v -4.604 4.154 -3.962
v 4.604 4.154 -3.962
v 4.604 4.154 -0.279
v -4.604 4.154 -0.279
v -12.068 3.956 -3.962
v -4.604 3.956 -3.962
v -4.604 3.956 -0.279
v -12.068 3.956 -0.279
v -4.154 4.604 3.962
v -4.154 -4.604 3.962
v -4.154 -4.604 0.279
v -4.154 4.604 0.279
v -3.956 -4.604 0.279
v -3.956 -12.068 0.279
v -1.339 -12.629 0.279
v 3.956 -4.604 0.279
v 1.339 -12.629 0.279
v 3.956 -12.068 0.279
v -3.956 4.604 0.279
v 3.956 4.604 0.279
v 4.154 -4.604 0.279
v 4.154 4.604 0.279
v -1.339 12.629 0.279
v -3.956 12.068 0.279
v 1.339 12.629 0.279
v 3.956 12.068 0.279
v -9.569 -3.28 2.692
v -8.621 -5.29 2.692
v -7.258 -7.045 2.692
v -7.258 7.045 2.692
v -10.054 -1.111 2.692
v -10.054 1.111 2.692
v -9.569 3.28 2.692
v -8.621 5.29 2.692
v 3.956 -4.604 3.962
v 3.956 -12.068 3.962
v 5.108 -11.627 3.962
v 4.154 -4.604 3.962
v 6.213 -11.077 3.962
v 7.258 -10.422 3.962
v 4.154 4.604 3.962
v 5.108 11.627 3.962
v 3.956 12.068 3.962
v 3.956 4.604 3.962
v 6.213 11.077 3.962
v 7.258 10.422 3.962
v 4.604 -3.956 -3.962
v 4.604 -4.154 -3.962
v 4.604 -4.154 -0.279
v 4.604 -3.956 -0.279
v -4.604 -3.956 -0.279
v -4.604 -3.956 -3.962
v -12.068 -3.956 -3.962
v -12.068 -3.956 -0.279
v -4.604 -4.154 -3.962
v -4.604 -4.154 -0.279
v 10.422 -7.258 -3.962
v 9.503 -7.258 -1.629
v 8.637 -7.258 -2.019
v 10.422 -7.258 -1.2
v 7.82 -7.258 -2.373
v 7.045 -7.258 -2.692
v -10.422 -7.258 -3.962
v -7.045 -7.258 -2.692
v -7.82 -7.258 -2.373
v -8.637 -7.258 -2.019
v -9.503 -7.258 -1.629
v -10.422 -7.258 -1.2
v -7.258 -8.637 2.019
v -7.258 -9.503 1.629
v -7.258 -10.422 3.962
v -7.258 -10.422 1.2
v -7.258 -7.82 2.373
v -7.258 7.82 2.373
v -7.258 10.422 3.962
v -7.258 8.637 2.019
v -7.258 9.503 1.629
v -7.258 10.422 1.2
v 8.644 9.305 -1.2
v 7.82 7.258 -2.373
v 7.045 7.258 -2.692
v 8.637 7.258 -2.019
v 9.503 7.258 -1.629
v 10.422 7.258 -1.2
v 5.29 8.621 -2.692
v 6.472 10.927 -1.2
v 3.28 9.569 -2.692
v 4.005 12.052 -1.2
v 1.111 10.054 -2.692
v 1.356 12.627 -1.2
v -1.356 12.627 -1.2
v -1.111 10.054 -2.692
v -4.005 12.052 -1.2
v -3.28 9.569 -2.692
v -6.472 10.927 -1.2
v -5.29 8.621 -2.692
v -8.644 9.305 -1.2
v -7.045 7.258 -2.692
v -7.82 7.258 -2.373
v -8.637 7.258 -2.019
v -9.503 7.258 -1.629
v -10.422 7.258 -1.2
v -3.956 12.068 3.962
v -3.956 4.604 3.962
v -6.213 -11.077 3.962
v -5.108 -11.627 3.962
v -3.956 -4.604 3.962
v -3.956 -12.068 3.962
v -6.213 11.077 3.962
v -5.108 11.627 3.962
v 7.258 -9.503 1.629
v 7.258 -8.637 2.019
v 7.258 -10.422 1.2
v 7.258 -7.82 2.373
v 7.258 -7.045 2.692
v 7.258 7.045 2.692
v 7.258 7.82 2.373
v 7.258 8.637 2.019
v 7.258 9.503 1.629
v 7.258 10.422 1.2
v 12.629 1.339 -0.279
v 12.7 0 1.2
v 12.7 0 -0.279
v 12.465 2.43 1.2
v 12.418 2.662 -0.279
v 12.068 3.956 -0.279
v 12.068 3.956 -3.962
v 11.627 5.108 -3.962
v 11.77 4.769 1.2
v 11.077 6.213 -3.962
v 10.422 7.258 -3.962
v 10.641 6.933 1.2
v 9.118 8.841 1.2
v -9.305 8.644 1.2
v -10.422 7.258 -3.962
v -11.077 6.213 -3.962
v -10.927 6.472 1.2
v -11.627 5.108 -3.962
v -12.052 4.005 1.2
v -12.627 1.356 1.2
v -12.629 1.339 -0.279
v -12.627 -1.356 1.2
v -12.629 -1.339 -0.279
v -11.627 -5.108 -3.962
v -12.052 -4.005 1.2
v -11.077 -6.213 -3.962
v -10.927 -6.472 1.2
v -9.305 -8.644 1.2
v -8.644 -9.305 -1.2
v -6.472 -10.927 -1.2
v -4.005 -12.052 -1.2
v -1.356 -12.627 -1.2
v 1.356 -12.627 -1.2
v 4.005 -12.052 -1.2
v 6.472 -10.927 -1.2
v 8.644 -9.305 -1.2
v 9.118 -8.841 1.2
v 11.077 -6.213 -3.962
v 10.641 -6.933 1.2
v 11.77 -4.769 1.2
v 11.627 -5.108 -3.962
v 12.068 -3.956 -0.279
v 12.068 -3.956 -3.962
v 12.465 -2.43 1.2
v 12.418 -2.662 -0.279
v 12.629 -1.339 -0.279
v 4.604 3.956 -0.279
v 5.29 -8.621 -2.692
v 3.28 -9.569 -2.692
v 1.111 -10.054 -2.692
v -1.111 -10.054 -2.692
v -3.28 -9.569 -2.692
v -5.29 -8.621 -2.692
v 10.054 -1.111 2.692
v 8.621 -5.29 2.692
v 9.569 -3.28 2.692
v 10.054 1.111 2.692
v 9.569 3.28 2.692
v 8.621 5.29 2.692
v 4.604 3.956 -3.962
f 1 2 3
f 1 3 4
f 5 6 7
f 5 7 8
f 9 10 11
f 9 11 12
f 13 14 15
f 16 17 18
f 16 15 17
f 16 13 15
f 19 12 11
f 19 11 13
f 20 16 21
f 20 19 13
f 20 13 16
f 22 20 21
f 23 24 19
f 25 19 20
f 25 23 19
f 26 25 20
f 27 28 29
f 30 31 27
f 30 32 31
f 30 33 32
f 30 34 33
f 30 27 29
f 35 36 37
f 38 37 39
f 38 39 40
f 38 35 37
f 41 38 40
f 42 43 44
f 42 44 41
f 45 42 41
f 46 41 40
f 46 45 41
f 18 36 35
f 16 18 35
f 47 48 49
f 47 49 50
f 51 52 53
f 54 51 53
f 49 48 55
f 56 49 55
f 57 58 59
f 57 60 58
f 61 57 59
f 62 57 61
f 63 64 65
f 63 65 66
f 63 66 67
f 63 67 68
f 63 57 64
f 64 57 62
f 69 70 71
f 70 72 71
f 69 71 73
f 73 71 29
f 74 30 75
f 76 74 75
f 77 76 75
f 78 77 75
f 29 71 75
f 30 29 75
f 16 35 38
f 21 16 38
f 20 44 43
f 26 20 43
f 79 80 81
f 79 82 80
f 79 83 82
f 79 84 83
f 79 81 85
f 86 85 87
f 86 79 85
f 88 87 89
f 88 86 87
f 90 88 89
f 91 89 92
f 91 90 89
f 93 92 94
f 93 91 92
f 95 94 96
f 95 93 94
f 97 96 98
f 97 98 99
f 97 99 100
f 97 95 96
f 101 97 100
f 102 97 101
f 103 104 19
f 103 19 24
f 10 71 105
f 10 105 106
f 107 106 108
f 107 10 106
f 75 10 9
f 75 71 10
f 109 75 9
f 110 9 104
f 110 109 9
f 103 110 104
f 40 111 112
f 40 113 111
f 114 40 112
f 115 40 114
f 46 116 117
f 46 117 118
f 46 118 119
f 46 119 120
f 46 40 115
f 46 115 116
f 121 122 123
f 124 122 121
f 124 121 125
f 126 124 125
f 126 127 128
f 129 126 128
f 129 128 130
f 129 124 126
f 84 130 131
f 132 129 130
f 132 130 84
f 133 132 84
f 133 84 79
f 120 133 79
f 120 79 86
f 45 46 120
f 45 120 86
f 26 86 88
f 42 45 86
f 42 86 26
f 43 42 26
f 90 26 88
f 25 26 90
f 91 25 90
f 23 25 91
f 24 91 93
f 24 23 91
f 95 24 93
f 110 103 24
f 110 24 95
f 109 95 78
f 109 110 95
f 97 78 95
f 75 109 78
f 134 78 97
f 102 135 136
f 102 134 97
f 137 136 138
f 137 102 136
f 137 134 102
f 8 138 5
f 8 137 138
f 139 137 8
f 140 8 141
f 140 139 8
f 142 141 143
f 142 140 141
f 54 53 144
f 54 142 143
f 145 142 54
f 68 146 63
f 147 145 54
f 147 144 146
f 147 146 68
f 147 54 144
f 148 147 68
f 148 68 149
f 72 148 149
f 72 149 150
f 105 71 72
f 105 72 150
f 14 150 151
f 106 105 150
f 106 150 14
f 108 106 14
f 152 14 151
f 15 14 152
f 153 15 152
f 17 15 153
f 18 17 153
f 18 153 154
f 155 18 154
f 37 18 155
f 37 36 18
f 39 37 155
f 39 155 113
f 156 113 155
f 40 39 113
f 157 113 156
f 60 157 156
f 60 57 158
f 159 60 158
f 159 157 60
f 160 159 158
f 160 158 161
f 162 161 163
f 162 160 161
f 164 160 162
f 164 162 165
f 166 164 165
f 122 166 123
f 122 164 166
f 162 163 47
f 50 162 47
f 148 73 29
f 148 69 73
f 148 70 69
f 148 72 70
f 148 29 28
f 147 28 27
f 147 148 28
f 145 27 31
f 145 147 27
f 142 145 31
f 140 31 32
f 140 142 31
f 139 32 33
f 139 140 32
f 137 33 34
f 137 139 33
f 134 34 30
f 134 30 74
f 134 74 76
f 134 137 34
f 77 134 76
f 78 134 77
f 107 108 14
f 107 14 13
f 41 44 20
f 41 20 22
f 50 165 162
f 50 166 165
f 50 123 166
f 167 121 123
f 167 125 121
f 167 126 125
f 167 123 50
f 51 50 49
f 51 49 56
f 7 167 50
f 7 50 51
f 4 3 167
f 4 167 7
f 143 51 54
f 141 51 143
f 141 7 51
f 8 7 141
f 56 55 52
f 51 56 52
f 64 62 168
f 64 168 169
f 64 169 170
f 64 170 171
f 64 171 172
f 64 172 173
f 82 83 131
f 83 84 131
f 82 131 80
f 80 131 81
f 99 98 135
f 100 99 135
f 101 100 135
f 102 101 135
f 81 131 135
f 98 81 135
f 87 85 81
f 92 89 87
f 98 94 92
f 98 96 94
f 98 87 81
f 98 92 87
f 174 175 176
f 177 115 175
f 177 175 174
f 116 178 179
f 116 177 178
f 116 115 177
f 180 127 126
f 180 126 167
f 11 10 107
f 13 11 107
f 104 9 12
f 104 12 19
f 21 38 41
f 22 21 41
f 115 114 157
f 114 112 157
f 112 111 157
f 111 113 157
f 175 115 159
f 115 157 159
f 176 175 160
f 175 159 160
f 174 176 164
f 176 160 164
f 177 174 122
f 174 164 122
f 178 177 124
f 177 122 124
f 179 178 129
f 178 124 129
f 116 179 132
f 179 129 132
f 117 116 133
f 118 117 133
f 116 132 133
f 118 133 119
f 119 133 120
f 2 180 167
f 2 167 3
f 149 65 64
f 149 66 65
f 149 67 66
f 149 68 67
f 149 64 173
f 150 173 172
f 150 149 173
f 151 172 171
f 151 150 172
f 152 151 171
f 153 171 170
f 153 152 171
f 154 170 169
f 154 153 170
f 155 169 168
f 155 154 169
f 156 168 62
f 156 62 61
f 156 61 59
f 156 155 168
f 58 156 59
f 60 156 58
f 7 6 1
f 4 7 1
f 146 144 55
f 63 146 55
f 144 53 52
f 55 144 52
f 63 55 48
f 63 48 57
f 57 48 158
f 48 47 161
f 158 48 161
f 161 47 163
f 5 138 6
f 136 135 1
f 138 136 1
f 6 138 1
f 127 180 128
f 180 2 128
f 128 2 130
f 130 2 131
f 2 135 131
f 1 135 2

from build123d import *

# Parameters (mm, degrees)
SKETCH1_R             = 12.7
BOSS_EXTRUDE1_DEPTH   = 3.9624
SKETCH2_W             = 7.9121
SKETCH2_H             = 25.4
CUT_EXTRUDE1_DEPTH    = 3.683
SKETCH3_W             = 25.4
SKETCH3_H             = 7.9121
CUT_EXTRUDE2_DEPTH    = 3.683
SKETCH4_W             = 5.44195
SKETCH4_H             = 25.4
CUT_EXTRUDE3_DEPTH    = 1.27
SKETCH5_W             = 25.4
SKETCH5_H             = 5.44195
CUT_EXTRUDE4_DEPTH    = 1.27
CHAMFER1_SIZE         = 2.58492625
CHAMFER1_SIZE2        = 1.492407866
CHAMFER1_PART_2_SIZE  = 2.58492625
CHAMFER1_PART_2_SIZE2 = 1.492407866
CHAMFER1_PART_3_SIZE  = 2.58492625
CHAMFER1_PART_3_SIZE2 = 1.492407866
CHAMFER1_PART_4_SIZE  = 2.58492625
CHAMFER1_PART_4_SIZE2 = 1.492407866
SKETCH6_W             = 8.307705
SKETCH6_H             = 9.2075
CUT_EXTRUDE5_DEPTH    = 3.683
SKETCH7_W             = 9.2075
SKETCH7_H             = 8.307705
CUT_EXTRUDE6_DEPTH    = 3.683


with BuildPart() as part:
    # Sketch1 → Boss-Extrude1 (new body, symmetric)
    with BuildSketch(Plane.XY):
        Circle(SKETCH1_R)
    extrude(amount=BOSS_EXTRUDE1_DEPTH, both=True)

    # Sketch2 → Cut-Extrude1 (cut)
    with BuildSketch(Plane.XY.offset(3.9624)):
        Rectangle(SKETCH2_W, SKETCH2_H)
    extrude(amount=-CUT_EXTRUDE1_DEPTH, mode=Mode.SUBTRACT)

    # Sketch3 → Cut-Extrude2 (cut)
    with BuildSketch(Plane(origin=(0, 0, -3.9624), x_dir=(-1, 0, 0), z_dir=(0, 0, -1))):
        Rectangle(SKETCH3_W, SKETCH3_H)
    extrude(amount=-CUT_EXTRUDE2_DEPTH, mode=Mode.SUBTRACT)

    # Sketch4 → Cut-Extrude3 (cut)
    with BuildSketch(Plane.XY.offset(3.9624)):
        with Locations((9.979025, 0)):
            Rectangle(SKETCH4_W, SKETCH4_H)
        with Locations((-9.979025, 0)):
            Rectangle(SKETCH4_W, SKETCH4_H)
    extrude(amount=-CUT_EXTRUDE3_DEPTH, mode=Mode.SUBTRACT)

    # Sketch5 → Cut-Extrude4 (cut)
    with BuildSketch(Plane(origin=(0, 0, -3.9624), x_dir=(-1, 0, 0), z_dir=(0, 0, -1))):
        with Locations((0, 9.979025)):
            Rectangle(SKETCH5_W, SKETCH5_H)
        with Locations((0, -9.979025)):
            Rectangle(SKETCH5_W, SKETCH5_H)
    extrude(amount=-CUT_EXTRUDE4_DEPTH, mode=Mode.SUBTRACT)

    # Chamfer1
    chamfer1_edges = [part.edges().sort_by_distance(p)[0] for p in [
        (0, 12.7, -2.6924),
    ]]
    chamfer1_side = [part.faces().sort_by_distance(p)[0] for p in [
        (0, 9.480522033, -2.6924),
    ]]
    chamfer(chamfer1_edges, length=CHAMFER1_SIZE, length2=CHAMFER1_SIZE2, reference=chamfer1_side[0])

    # Chamfer1 part 2
    chamfer1_part_2_edges = [part.edges().sort_by_distance(p)[0] for p in [
        (0, -12.7, -2.6924),
    ]]
    chamfer1_part_2_side = [part.faces().sort_by_distance(p)[0] for p in [
        (0, -9.480522033, -2.6924),
    ]]
    chamfer(chamfer1_part_2_edges, length=CHAMFER1_PART_2_SIZE, length2=CHAMFER1_PART_2_SIZE2, reference=chamfer1_part_2_side[0])

    # Chamfer1 part 3
    chamfer1_part_3_edges = [part.edges().sort_by_distance(p)[0] for p in [
        (11.257602653, -5.8784677, 2.6924),
    ]]
    chamfer1_part_3_side = [part.faces().sort_by_distance(p)[0] for p in [
        (9.480522033, 0, 2.6924),
    ]]
    chamfer(chamfer1_part_3_edges, length=CHAMFER1_PART_3_SIZE, length2=CHAMFER1_PART_3_SIZE2, reference=chamfer1_part_3_side[0])

    # Chamfer1 part 4
    chamfer1_part_4_edges = [part.edges().sort_by_distance(p)[0] for p in [
        (-12.7, 0, 2.6924),
    ]]
    chamfer1_part_4_side = [part.faces().sort_by_distance(p)[0] for p in [
        (-9.480522033, 0, 2.6924),
    ]]
    chamfer(chamfer1_part_4_edges, length=CHAMFER1_PART_4_SIZE, length2=CHAMFER1_PART_4_SIZE2, reference=chamfer1_part_4_side[0])

    # Sketch6 → Cut-Extrude5 (cut)
    with BuildSketch(Plane.XY.offset(3.9624)):
        Rectangle(SKETCH6_W, SKETCH6_H)
    extrude(amount=-CUT_EXTRUDE5_DEPTH, mode=Mode.SUBTRACT)

    # Sketch7 → Cut-Extrude6 (cut)
    with BuildSketch(Plane(origin=(0, 0, -3.9624), x_dir=(-1, 0, 0), z_dir=(0, 0, -1))):
        Rectangle(SKETCH7_W, SKETCH7_H)
    extrude(amount=-CUT_EXTRUDE6_DEPTH, mode=Mode.SUBTRACT)


solid = part.part
